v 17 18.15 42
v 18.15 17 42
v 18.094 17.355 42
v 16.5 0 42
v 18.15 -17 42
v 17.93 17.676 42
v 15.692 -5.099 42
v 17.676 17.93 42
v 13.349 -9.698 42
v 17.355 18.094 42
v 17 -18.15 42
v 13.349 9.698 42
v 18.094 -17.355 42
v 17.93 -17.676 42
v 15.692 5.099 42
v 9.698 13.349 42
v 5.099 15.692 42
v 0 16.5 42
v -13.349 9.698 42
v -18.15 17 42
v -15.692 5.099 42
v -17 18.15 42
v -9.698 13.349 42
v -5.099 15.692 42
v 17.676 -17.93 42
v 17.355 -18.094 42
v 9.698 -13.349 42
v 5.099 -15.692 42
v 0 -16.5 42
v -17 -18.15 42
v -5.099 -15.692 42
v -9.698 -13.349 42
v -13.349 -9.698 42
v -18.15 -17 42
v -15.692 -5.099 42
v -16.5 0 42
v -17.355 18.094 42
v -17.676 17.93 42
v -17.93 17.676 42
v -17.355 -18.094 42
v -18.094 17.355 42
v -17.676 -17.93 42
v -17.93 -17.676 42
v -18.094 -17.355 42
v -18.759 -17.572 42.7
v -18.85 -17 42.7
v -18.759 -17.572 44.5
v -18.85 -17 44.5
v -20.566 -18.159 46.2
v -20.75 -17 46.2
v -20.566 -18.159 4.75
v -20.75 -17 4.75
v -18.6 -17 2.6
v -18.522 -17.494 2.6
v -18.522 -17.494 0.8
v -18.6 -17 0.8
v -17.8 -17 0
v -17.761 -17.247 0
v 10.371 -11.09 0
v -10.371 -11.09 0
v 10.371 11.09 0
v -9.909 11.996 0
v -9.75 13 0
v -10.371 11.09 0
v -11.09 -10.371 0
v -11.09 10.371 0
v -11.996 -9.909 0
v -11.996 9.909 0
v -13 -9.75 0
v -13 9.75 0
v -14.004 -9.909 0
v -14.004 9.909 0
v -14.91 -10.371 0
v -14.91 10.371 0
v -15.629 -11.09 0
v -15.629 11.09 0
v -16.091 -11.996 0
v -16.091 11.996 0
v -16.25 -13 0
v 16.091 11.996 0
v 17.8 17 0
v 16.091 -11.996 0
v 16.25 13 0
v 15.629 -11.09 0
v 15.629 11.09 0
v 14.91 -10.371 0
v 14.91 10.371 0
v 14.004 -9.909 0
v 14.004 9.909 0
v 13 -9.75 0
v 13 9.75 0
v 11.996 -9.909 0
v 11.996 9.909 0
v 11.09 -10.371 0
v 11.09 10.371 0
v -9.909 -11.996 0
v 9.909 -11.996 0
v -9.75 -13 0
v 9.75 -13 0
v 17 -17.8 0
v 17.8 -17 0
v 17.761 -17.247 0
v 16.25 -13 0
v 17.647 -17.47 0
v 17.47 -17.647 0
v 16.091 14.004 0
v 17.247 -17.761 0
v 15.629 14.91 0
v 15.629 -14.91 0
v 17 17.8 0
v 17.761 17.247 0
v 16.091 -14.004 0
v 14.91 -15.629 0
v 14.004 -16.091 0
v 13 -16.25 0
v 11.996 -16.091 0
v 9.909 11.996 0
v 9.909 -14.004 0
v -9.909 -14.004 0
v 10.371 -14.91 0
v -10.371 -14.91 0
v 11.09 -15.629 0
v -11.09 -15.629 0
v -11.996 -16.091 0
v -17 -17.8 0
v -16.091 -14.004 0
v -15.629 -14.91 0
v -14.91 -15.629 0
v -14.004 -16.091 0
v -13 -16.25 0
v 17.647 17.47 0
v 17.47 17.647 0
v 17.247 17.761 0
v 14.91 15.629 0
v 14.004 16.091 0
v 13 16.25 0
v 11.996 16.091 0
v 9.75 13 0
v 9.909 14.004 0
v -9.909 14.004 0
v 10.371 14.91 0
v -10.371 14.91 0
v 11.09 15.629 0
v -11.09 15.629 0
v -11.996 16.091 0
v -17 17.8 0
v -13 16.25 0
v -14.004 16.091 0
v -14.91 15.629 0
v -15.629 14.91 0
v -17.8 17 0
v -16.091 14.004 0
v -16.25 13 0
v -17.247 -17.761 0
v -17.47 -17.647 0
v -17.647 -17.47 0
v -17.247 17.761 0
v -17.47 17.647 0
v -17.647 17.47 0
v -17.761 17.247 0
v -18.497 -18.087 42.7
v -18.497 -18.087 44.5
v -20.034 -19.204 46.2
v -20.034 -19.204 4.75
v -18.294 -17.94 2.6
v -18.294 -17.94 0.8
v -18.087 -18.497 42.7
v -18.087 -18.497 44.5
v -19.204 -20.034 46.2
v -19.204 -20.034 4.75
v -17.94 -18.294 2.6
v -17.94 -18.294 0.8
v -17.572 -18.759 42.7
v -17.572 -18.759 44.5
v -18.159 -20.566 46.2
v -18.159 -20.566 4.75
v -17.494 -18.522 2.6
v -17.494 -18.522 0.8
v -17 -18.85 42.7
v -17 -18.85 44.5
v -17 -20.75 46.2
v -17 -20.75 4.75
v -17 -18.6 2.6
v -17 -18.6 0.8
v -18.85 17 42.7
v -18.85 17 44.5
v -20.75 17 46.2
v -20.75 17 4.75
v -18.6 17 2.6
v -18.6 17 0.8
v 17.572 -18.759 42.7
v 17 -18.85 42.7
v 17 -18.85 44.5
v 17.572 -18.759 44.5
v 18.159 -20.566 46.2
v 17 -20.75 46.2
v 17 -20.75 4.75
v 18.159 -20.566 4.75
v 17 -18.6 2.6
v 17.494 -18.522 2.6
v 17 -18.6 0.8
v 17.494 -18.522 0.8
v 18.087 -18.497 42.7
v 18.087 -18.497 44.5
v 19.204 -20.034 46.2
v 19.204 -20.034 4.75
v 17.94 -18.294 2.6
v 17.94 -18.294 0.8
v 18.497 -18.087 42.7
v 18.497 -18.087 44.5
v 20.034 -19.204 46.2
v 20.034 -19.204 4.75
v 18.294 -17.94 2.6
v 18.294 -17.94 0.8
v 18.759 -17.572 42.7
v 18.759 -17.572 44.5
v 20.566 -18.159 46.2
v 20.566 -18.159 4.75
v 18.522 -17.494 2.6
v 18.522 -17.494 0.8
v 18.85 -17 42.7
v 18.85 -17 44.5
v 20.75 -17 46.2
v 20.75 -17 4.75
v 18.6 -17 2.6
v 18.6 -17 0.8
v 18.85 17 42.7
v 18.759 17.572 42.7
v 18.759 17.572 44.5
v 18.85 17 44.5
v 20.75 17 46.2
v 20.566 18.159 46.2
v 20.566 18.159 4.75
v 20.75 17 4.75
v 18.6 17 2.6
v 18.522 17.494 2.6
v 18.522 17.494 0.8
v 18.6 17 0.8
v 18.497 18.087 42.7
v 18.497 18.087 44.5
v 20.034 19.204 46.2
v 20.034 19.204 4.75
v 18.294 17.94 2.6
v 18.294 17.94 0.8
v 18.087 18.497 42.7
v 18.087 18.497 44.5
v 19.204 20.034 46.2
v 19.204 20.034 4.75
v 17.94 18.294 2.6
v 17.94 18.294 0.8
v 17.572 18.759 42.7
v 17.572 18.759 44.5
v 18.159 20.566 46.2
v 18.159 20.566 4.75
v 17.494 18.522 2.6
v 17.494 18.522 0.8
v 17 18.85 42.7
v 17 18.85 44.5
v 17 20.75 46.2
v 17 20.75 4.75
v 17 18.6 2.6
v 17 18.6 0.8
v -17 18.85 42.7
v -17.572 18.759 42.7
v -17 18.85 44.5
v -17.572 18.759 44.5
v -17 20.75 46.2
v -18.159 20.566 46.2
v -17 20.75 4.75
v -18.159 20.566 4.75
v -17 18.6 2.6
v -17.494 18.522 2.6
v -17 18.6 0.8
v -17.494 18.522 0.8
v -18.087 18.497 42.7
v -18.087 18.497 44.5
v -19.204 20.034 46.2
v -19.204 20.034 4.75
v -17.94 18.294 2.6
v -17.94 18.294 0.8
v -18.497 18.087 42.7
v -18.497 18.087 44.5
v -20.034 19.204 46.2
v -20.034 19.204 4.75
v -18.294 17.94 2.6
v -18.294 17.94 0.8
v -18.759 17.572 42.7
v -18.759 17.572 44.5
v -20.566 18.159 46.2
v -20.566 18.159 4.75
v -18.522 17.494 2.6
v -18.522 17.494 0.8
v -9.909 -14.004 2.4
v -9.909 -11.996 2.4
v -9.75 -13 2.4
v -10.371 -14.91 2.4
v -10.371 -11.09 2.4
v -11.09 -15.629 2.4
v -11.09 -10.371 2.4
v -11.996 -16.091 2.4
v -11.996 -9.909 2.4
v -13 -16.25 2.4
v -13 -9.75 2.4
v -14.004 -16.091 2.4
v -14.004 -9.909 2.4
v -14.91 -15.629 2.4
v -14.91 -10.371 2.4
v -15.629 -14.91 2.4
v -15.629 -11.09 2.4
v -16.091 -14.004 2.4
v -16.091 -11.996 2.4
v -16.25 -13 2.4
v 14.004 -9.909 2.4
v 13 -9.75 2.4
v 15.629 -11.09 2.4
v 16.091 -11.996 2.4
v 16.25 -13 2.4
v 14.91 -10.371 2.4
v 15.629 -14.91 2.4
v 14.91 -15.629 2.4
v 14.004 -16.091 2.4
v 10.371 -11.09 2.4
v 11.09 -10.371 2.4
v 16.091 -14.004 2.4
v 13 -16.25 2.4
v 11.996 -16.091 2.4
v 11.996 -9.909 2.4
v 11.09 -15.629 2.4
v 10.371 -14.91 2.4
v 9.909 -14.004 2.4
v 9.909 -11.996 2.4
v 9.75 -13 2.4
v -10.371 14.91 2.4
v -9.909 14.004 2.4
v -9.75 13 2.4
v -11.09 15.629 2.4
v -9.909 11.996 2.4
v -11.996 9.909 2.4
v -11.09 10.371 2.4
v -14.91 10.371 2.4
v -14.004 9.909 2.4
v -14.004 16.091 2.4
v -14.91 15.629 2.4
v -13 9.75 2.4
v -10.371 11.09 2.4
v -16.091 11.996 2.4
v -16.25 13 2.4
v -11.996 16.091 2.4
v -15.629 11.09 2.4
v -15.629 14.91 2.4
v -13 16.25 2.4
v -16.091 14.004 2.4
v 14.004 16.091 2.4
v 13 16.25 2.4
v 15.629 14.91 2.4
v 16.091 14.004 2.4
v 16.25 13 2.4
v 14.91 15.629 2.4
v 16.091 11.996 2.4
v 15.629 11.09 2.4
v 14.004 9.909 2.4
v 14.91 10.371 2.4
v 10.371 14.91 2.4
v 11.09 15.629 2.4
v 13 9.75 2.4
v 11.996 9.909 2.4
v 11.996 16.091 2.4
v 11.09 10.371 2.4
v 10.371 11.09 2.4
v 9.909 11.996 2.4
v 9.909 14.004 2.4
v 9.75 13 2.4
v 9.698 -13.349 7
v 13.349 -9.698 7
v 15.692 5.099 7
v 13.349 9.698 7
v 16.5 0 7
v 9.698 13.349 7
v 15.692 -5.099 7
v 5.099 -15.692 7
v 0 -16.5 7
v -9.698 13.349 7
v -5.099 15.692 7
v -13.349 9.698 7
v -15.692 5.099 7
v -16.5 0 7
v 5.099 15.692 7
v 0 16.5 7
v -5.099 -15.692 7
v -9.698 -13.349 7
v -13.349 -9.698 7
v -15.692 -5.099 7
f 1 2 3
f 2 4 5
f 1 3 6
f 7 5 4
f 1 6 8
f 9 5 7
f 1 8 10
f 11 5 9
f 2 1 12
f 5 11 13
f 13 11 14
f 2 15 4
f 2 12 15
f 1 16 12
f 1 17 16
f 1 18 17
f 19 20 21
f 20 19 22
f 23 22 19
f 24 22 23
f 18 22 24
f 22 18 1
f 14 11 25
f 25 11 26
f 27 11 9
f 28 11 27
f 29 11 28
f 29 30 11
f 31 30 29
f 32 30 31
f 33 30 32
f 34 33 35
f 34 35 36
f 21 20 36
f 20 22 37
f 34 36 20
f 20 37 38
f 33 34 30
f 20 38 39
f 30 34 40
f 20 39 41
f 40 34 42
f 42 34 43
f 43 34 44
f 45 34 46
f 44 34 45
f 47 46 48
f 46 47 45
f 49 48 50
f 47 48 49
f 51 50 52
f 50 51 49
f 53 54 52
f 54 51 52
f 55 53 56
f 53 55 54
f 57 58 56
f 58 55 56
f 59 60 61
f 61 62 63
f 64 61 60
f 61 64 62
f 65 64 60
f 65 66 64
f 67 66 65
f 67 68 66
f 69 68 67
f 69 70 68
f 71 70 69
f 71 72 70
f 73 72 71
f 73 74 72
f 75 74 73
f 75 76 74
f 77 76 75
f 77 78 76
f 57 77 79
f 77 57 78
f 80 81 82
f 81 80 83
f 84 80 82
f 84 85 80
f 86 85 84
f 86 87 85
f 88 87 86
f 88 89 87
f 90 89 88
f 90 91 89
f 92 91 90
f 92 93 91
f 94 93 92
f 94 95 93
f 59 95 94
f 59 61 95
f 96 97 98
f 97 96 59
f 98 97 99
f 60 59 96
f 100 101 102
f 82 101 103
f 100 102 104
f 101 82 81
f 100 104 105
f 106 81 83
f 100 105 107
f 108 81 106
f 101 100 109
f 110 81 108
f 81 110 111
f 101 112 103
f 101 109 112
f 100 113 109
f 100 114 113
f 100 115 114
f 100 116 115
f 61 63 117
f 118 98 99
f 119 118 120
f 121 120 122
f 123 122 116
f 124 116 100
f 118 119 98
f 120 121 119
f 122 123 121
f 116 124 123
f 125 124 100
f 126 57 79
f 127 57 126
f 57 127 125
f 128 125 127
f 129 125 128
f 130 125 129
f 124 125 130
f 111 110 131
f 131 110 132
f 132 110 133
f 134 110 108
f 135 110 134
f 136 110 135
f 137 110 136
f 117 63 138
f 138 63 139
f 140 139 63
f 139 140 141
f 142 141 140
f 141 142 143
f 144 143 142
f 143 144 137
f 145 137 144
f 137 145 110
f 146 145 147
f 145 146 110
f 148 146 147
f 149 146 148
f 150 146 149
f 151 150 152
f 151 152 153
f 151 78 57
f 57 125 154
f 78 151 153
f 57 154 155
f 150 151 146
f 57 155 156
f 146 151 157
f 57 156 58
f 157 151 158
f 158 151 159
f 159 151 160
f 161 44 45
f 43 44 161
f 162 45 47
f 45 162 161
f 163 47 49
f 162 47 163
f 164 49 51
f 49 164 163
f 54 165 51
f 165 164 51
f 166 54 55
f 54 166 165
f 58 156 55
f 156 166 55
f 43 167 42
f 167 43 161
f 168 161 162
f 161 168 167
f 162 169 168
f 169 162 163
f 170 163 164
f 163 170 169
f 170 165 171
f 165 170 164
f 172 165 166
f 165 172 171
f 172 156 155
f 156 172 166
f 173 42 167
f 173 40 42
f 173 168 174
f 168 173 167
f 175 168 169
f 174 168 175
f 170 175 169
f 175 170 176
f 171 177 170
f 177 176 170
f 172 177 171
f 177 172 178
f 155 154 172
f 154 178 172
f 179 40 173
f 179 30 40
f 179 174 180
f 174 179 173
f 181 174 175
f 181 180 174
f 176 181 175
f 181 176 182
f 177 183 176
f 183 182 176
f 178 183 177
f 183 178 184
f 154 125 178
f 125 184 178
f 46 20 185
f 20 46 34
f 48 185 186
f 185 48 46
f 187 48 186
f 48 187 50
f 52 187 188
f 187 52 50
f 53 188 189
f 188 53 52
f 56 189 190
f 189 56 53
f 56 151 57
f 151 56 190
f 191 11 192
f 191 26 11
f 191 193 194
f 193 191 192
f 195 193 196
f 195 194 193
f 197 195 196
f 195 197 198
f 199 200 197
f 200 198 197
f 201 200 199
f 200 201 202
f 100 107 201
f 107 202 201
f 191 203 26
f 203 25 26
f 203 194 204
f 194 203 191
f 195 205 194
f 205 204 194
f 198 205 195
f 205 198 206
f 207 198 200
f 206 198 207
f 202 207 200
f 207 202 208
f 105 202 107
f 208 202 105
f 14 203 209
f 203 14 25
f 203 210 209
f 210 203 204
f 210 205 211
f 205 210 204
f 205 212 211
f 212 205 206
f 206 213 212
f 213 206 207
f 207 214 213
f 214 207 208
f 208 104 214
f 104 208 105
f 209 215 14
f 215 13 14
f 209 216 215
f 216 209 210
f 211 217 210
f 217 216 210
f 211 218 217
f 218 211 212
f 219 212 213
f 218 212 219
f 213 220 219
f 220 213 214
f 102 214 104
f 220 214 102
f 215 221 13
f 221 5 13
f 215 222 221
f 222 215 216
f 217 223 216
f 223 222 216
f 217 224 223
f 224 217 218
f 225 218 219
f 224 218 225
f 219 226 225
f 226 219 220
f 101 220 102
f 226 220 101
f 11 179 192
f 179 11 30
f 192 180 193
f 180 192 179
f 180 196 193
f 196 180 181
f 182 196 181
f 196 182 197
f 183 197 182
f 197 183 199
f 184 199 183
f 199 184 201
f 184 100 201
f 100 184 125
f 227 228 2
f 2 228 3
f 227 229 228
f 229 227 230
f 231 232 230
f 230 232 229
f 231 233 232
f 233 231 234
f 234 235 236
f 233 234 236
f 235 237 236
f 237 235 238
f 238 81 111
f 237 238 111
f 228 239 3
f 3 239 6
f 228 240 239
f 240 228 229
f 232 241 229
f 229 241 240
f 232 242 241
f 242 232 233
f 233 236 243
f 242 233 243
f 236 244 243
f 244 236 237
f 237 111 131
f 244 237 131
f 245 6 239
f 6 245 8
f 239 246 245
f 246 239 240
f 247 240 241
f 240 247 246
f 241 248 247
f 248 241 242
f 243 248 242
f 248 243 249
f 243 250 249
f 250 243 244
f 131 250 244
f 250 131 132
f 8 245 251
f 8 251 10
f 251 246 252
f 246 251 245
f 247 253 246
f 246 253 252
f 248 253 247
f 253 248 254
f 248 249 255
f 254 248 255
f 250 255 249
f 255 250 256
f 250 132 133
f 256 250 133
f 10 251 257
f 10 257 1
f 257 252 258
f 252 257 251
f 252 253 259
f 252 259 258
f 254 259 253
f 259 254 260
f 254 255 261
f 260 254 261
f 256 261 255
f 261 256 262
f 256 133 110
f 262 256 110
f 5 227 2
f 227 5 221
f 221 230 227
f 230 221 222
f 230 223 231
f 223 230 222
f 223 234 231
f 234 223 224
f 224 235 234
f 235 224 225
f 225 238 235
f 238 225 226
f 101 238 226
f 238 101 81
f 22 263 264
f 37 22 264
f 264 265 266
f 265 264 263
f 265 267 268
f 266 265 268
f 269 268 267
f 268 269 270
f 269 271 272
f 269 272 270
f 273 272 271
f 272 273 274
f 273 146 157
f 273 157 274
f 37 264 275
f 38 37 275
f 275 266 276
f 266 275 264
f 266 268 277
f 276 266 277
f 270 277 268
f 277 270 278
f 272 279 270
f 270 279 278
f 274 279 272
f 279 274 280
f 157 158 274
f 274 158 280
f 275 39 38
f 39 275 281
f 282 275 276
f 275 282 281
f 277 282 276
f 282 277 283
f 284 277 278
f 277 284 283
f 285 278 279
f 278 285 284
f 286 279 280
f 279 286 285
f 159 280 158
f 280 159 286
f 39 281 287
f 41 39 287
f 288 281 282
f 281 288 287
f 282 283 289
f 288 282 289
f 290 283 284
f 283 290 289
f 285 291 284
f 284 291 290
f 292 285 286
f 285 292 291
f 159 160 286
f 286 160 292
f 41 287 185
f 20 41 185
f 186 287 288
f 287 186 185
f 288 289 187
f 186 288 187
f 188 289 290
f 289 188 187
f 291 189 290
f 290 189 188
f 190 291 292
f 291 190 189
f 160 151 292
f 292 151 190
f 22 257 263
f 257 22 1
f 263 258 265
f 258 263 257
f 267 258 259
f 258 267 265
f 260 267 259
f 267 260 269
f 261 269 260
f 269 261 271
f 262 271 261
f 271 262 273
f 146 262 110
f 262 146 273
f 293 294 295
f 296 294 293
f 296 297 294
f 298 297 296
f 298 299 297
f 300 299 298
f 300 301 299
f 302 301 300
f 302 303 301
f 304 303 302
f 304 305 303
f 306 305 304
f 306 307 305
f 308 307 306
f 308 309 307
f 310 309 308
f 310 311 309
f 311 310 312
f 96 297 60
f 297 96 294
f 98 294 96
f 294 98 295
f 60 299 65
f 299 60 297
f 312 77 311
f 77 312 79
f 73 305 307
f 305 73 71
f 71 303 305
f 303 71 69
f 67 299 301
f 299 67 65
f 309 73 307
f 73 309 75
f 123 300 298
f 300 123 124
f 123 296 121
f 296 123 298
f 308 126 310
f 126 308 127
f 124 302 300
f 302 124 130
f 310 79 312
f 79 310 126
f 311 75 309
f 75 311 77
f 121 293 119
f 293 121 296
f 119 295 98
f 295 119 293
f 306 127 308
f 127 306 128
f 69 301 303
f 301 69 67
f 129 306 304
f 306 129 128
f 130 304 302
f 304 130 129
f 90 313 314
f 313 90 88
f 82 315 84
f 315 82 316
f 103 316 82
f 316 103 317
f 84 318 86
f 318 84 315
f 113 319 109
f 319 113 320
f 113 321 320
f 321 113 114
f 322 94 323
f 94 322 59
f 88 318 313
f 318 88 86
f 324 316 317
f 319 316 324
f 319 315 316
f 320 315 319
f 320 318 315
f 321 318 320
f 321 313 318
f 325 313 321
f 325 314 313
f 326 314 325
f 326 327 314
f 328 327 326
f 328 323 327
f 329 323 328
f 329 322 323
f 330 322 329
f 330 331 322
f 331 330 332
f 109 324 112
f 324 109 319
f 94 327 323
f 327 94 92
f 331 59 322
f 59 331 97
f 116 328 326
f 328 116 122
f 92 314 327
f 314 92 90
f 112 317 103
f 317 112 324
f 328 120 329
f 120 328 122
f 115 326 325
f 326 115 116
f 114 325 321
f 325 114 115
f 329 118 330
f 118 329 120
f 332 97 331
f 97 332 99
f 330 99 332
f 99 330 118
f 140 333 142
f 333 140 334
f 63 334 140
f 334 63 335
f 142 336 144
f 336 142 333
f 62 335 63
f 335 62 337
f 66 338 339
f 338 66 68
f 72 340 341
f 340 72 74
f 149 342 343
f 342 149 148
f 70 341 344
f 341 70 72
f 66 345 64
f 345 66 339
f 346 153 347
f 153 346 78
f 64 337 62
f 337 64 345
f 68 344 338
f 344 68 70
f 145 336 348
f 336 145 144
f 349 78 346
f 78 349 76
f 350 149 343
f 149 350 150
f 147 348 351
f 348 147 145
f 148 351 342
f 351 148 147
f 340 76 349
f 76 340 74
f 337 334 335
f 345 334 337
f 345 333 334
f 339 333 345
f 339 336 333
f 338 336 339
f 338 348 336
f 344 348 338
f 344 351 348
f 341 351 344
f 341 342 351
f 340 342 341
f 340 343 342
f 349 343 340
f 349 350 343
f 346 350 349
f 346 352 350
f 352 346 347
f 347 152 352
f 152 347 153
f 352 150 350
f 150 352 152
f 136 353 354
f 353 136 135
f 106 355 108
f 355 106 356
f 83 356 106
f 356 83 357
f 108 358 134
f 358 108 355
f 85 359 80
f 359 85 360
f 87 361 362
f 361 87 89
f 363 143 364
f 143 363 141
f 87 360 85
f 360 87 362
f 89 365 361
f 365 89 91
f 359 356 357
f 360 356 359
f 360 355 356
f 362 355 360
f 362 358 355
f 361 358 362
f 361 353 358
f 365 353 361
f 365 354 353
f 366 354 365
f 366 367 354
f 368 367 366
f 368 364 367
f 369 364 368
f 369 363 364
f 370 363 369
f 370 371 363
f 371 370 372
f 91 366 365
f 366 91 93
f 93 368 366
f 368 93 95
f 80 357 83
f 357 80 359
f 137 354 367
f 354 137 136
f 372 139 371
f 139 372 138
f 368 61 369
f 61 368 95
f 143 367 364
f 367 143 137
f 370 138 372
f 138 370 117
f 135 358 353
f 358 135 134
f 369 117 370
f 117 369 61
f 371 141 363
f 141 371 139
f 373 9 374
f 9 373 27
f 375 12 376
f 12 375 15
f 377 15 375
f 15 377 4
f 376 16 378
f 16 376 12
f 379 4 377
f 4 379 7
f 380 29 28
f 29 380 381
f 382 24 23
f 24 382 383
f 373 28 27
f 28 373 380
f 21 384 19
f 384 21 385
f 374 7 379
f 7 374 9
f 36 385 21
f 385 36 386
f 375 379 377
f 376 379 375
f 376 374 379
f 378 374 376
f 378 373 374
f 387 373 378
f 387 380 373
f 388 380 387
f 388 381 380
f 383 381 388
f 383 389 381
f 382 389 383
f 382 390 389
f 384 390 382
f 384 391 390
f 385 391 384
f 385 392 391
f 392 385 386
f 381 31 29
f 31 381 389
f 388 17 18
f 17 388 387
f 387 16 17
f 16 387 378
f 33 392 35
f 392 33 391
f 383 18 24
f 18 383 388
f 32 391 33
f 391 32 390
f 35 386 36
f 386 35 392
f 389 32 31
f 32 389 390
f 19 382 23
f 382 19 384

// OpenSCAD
// file: ../lib/TOGGridfinityLib-v1.scad
/* Edge profile point arrays!
 *
 * Should be listed from bottom to top.
 * - X=0 is at the edge of the cell (*not the slightly narrower block*)
 * - Positive X is the offset into the left side
 * - Y=0 is the floor.
 * - Corner profile point lists start with the base
 *   and go upwards to the side.
 */

// Regular block bottom
tog_gridfinity_block_bottom_corner_profile_points = [
	[3.20, 0.00], // Right end of bottom bevel
	[2.40, 0.80],
	[2.40, 2.60],
	[0.25, 4.75], // Top of left bevel
];

// Block lip, with min(X) = 0.25
tog_gridfinity_block_lip_corner_profile_points = [
	[2.85, 0.00], // Right end of bottom bevel
	[2.15, 0.70],
	[2.15, 2.50],
	[0.25, 4.20], // Top tip
];

// Full-cell lip.   Starts at cell edge instead of 0.25 inward for blocks.
// Alternatively one could always use this and just intersect with the block hull,
// (or subtracting the inverse)
// which may be simpler especially if making blocks with a grid on top.
tog_gridfinity_full_lip_corner_profile_points = [
	[2.85, 0.00], // Right end of bottom bevel
	[2.15, 0.70],
	[2.15, 2.50],
	[0.00, 4.65], // Top tip
];

function tog_gridfinity_make_corner_extrudable_points(corner_profile_points, margin, block_height=7, corner_radius=4) = [
	[0, 0],
	for( point=corner_profile_points ) [point[0] - corner_radius, point[1]],
	[margin - corner_radius, block_height],
	[0, block_height],
];

function tog_gridfinity_reverse_list(list) = [
	for( i=[len(list)-1: -1 : 0] ) list[i]
];

/**
 * Reverses the list of points for use as a cutout at the top of a block
 * and also adds some amount of Y
 */
//function tog_gridfinity_adjusted_lip_points(point_list, delta_y=0) = [
//	for( i=[len(list)-1: -1 : 0] ) list[i]
//];

// Extrudable points for an entire block, with lip, filled to the specified height
function tog_gridfinity_make_block_with_lip_extrudable_points( block_height, floor_height=7, corner_radius=4, wall_thickness=2 ) = [
	[0, 0],
	for( point=tog_gridfinity_block_bottom_corner_profile_points ) [point[0] - corner_radius, point[1]],
	for( point=tog_gridfinity_reverse_list(tog_gridfinity_block_lip_corner_profile_points) ) [point[0] - corner_radius, point[1] + block_height],
	each (floor_height == block_height ? [] : [
		// TODO: Really want to filter this list of down-the-inside-of-the-lip points
		// based on being >= floor height.
		// If floor_height is too close to block_height, I imagine this could be a mess:
		[tog_gridfinity_block_lip_corner_profile_points[0][0] - corner_radius, max(floor_height, block_height-2)], // 2 is probably fine; really want a max. 45deg from wall thickness to innermost point in lip
		[wall_thickness+0.25 - corner_radius, max(floor_height, block_height-4)], // difference y=-2 is probably fine; really want a max. 45deg from wall thickness to innermost point in lip
		[wall_thickness+0.25 - corner_radius, floor_height+(corner_radius-wall_thickness-0.25)],
		[0, floor_height],
	]),
	[0, floor_height],,
	//[tog_gridfinity_block_lip_corner_profile_points[0][0] - corner_radius, floor_height],
];

// Create full extrudable polygon where x=0 refers to the pivot point
function tog_gridfinity_make_block_bottom_corner_extrudable_points(block_height=7, corner_radius=4) = tog_gridfinity_make_corner_extrudable_points(
	tog_gridfinity_block_bottom_corner_profile_points,
	0.25,
	block_height=block_height,
	corner_radius=corner_radius
);

module tog_gridfinity_block_from_profile_points(profile_points, block_width=42, corner_radius=4, overlap=0) {
	bottom_z = profile_points[0][1];
	top_z    = profile_points[len(profile_points)-1][1];
	for( r=[0:90:270] ) rotate([0,0,r]) {
		translate([-block_width/2+corner_radius, -block_width/2+corner_radius, 0]) {
			rotate_extrude(angle=90) {
				polygon(profile_points);
			}
		}
		translate([-block_width/2+corner_radius, 0, 0]) {
			rotate([90,0,0]) linear_extrude(block_width-2*corner_radius+overlap*2, center=true) {
				polygon(profile_points);
			}
		}
	}
	translate([0,0,(bottom_z+top_z)/2]) cube([block_width-corner_radius*2+overlap*2, block_width-corner_radius*2+overlap*2, top_z-bottom_z], center=true);
}


/**
 * Hull to be intersected with block bottoms for gridfinity compatibility.
 * Overlap=0 seems to work, but it can be set to a small value, like 1/64,
 * if OpenSCAD gets confused about exactly interfacing surfaces.
 */
module tog_gridfinity_block_bottom(height=14, gridfinity_pitch=42, corner_radius=4, overlap=0) {
	tog_gridfinity_block_from_profile_points(tog_gridfinity_make_block_bottom_corner_extrudable_points(height, corner_radius), gridfinity_pitch, corner_radius, overlap);
}

module tog_gridfinity_block_with_lip(
	height=14, floor_height=7,
	gridfinity_pitch=42, corner_radius=4, overlap=0,
	magnet_hole_diameter=6.5,
	magnet_hole_depth=2.4,
) {
	difference() {
		tog_gridfinity_block_from_profile_points(tog_gridfinity_make_block_with_lip_extrudable_points(height, floor_height, corner_radius), gridfinity_pitch, corner_radius, overlap);
		if( magnet_hole_diameter > 0 && magnet_hole_depth > 0 ) for( ym=[-1,1] ) for( xm=[-1,1] ) {
			translate([13*xm, 13*ym, 0]) cylinder(d=magnet_hole_diameter, h=magnet_hole_depth*2, center=true);
		}
	}
}
// main file
$fn = 20;
block_height = 42;
hole_diameter = 33;
floor_height = 7;

include <../lib/TOGGridfinityLib-v1.scad>

difference() {
	tog_gridfinity_block_with_lip(block_height, block_height, 42, 4);
	translate([0, 0, block_height]) cylinder(d=hole_diameter, h=(block_height-floor_height)*2, center=true);
}
